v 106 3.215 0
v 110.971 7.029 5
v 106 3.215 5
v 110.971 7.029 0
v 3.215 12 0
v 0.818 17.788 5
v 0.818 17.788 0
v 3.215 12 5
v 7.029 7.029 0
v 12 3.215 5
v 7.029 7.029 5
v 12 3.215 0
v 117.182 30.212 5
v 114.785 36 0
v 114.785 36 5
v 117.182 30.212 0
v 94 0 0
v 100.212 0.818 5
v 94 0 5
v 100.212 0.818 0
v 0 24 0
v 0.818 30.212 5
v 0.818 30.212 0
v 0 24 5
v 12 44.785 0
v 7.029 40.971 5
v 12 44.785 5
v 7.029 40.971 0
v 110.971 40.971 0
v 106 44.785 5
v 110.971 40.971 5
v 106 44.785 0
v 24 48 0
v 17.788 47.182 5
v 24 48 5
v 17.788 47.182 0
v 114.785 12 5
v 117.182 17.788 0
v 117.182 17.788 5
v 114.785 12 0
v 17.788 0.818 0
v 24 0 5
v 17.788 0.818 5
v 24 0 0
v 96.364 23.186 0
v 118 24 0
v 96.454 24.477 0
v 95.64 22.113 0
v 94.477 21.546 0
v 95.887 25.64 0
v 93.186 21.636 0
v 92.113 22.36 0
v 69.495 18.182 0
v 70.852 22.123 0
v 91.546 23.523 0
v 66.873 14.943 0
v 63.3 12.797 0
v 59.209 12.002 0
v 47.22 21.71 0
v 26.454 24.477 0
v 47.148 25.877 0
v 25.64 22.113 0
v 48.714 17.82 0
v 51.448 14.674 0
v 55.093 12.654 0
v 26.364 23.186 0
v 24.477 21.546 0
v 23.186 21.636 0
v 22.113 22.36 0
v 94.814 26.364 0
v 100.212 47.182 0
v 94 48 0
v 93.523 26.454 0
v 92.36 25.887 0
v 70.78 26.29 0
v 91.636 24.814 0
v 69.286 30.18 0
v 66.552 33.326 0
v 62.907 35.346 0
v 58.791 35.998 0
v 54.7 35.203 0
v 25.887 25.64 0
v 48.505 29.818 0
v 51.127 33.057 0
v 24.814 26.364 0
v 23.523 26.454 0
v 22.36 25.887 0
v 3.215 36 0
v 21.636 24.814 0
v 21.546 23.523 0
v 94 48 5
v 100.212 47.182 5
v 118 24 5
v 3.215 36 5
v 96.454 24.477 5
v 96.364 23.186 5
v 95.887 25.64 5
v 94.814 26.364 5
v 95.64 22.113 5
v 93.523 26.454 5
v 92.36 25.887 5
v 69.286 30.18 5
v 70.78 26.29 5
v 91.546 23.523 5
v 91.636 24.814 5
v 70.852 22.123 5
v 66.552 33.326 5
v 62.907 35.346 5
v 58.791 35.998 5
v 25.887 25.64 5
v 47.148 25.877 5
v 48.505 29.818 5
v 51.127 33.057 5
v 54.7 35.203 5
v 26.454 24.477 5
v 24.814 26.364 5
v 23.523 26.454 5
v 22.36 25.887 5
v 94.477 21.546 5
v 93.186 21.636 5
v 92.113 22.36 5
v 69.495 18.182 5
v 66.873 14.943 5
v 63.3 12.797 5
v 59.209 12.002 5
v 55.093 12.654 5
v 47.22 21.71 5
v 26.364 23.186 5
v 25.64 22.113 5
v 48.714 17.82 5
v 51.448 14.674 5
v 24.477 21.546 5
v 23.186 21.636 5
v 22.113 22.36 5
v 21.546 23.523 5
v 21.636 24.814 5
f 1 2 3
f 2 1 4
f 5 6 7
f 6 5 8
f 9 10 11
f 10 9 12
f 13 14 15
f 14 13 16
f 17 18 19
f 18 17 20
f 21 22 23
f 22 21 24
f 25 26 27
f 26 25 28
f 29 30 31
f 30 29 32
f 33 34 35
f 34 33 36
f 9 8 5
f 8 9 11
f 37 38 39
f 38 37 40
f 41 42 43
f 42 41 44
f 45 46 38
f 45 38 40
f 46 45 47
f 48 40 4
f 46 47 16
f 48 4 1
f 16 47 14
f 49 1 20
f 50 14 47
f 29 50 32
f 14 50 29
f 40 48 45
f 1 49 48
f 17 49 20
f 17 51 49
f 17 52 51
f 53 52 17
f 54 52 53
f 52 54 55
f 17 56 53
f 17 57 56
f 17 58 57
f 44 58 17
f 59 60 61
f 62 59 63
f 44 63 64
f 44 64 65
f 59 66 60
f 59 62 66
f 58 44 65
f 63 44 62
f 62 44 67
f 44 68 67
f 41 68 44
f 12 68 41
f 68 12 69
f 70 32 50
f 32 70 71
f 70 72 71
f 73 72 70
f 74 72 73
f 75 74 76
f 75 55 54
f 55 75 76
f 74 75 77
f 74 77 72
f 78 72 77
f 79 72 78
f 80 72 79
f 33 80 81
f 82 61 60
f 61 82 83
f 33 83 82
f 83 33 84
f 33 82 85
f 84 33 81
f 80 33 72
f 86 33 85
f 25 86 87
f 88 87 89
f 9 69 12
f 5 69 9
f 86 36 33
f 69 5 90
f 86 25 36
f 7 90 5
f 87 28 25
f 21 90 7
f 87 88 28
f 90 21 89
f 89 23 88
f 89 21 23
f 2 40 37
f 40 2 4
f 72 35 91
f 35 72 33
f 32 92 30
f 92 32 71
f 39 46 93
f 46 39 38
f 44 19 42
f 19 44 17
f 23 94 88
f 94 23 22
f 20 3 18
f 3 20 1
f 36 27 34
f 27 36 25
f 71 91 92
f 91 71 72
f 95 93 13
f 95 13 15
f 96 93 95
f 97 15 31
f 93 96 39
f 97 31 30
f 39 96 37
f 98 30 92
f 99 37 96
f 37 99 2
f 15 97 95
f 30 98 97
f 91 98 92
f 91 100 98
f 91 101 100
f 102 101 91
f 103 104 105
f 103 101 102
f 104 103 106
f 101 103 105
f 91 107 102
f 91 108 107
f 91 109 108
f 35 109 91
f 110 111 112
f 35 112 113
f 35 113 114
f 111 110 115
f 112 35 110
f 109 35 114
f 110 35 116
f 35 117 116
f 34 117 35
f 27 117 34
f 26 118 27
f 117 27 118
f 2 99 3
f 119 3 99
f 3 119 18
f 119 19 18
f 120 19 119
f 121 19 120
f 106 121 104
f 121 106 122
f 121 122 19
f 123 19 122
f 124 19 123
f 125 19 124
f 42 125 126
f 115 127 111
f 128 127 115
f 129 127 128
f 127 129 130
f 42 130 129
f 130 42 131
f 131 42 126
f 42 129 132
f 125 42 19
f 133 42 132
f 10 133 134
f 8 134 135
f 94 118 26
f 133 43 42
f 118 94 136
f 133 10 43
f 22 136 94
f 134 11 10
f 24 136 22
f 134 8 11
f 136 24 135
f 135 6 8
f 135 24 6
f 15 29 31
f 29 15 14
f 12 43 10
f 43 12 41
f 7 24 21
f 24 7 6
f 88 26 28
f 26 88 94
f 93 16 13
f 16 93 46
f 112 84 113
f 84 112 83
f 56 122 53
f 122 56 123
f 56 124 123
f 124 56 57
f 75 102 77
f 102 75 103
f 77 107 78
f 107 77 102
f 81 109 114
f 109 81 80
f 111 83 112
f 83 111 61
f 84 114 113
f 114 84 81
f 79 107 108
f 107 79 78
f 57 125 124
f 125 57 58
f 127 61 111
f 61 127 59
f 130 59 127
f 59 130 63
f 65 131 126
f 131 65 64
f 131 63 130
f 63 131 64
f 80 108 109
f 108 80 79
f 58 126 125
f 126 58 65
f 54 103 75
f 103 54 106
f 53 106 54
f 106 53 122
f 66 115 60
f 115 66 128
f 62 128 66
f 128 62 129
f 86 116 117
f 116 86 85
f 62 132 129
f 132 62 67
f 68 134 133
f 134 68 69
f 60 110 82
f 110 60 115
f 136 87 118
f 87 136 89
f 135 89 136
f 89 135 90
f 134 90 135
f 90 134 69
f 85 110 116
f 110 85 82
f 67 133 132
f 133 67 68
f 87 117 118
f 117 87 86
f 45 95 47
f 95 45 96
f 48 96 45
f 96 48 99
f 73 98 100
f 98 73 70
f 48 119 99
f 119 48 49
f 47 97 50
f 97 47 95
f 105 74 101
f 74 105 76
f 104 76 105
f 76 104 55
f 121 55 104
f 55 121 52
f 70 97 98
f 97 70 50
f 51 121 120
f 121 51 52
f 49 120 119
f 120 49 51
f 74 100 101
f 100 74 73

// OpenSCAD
$fn = 32;

// ----------------------------------------------------------------------
// Spacer plate: obround span 70, caps R24
// ----------------------------------------------------------------------

// --- parameters (mm) ---
bore_r = 12;              // centre bore radius
bolt_r = 2.5;             // bolt hole radius
plate_t = 5;              // plate thickness, Z (extrusion height)
span = 70;                // obround span
cap_r = 24;               // cap radius
fit_tol = 0.05;           // declared fit tolerance (prompt contract)
free_tol = 0.3;           // declared free tolerance (prompt contract)

profile = [[24, 48], [17.788, 47.182], [12, 44.785], [7.029, 40.971], [3.215, 36], [0.818, 30.212], [0, 24], [0.818, 17.788], [3.215, 12], [7.029, 7.029], [12, 3.215], [17.788, 0.818], [24, 0], [94, 0], [100.212, 0.818], [106, 3.215], [110.971, 7.029], [114.785, 12], [117.182, 17.788], [118, 24], [117.182, 30.212], [114.785, 36], [110.971, 40.971], [106, 44.785], [100.212, 47.182], [94, 48]];  // primary outline, 26 points, counter clockwise
void_1 = [[70.78, 26.29], [69.286, 30.18], [66.552, 33.326], [62.907, 35.346], [58.791, 35.998], [54.7, 35.203], [51.127, 33.057], [48.505, 29.818], [47.148, 25.877], [47.22, 21.71], [48.714, 17.82], [51.448, 14.674], [55.093, 12.654], [59.209, 12.002], [63.3, 12.797], [66.873, 14.943], [69.495, 18.182], [70.852, 22.123]];  // centre bore, 18 points
void_2 = [[26.454, 24.477], [25.887, 25.64], [24.814, 26.364], [23.523, 26.454], [22.36, 25.887], [21.636, 24.814], [21.546, 23.523], [22.113, 22.36], [23.186, 21.636], [24.477, 21.546], [25.64, 22.113], [26.364, 23.186]];  // end hole, 12 points
void_3 = [[96.454, 24.477], [95.887, 25.64], [94.814, 26.364], [93.523, 26.454], [92.36, 25.887], [91.636, 24.814], [91.546, 23.523], [92.113, 22.36], [93.186, 21.636], [94.477, 21.546], [95.64, 22.113], [96.364, 23.186]];  // end hole, 12 points

// --- the one profile operation ---
difference() {
  linear_extrude(height = plate_t) polygon(points = profile);
  translate([0, 0, -1])
    linear_extrude(height = plate_t + 2) polygon(points = void_1);
  translate([0, 0, -1])
    linear_extrude(height = plate_t + 2) polygon(points = void_2);
  translate([0, 0, -1])
    linear_extrude(height = plate_t + 2) polygon(points = void_3);
}
